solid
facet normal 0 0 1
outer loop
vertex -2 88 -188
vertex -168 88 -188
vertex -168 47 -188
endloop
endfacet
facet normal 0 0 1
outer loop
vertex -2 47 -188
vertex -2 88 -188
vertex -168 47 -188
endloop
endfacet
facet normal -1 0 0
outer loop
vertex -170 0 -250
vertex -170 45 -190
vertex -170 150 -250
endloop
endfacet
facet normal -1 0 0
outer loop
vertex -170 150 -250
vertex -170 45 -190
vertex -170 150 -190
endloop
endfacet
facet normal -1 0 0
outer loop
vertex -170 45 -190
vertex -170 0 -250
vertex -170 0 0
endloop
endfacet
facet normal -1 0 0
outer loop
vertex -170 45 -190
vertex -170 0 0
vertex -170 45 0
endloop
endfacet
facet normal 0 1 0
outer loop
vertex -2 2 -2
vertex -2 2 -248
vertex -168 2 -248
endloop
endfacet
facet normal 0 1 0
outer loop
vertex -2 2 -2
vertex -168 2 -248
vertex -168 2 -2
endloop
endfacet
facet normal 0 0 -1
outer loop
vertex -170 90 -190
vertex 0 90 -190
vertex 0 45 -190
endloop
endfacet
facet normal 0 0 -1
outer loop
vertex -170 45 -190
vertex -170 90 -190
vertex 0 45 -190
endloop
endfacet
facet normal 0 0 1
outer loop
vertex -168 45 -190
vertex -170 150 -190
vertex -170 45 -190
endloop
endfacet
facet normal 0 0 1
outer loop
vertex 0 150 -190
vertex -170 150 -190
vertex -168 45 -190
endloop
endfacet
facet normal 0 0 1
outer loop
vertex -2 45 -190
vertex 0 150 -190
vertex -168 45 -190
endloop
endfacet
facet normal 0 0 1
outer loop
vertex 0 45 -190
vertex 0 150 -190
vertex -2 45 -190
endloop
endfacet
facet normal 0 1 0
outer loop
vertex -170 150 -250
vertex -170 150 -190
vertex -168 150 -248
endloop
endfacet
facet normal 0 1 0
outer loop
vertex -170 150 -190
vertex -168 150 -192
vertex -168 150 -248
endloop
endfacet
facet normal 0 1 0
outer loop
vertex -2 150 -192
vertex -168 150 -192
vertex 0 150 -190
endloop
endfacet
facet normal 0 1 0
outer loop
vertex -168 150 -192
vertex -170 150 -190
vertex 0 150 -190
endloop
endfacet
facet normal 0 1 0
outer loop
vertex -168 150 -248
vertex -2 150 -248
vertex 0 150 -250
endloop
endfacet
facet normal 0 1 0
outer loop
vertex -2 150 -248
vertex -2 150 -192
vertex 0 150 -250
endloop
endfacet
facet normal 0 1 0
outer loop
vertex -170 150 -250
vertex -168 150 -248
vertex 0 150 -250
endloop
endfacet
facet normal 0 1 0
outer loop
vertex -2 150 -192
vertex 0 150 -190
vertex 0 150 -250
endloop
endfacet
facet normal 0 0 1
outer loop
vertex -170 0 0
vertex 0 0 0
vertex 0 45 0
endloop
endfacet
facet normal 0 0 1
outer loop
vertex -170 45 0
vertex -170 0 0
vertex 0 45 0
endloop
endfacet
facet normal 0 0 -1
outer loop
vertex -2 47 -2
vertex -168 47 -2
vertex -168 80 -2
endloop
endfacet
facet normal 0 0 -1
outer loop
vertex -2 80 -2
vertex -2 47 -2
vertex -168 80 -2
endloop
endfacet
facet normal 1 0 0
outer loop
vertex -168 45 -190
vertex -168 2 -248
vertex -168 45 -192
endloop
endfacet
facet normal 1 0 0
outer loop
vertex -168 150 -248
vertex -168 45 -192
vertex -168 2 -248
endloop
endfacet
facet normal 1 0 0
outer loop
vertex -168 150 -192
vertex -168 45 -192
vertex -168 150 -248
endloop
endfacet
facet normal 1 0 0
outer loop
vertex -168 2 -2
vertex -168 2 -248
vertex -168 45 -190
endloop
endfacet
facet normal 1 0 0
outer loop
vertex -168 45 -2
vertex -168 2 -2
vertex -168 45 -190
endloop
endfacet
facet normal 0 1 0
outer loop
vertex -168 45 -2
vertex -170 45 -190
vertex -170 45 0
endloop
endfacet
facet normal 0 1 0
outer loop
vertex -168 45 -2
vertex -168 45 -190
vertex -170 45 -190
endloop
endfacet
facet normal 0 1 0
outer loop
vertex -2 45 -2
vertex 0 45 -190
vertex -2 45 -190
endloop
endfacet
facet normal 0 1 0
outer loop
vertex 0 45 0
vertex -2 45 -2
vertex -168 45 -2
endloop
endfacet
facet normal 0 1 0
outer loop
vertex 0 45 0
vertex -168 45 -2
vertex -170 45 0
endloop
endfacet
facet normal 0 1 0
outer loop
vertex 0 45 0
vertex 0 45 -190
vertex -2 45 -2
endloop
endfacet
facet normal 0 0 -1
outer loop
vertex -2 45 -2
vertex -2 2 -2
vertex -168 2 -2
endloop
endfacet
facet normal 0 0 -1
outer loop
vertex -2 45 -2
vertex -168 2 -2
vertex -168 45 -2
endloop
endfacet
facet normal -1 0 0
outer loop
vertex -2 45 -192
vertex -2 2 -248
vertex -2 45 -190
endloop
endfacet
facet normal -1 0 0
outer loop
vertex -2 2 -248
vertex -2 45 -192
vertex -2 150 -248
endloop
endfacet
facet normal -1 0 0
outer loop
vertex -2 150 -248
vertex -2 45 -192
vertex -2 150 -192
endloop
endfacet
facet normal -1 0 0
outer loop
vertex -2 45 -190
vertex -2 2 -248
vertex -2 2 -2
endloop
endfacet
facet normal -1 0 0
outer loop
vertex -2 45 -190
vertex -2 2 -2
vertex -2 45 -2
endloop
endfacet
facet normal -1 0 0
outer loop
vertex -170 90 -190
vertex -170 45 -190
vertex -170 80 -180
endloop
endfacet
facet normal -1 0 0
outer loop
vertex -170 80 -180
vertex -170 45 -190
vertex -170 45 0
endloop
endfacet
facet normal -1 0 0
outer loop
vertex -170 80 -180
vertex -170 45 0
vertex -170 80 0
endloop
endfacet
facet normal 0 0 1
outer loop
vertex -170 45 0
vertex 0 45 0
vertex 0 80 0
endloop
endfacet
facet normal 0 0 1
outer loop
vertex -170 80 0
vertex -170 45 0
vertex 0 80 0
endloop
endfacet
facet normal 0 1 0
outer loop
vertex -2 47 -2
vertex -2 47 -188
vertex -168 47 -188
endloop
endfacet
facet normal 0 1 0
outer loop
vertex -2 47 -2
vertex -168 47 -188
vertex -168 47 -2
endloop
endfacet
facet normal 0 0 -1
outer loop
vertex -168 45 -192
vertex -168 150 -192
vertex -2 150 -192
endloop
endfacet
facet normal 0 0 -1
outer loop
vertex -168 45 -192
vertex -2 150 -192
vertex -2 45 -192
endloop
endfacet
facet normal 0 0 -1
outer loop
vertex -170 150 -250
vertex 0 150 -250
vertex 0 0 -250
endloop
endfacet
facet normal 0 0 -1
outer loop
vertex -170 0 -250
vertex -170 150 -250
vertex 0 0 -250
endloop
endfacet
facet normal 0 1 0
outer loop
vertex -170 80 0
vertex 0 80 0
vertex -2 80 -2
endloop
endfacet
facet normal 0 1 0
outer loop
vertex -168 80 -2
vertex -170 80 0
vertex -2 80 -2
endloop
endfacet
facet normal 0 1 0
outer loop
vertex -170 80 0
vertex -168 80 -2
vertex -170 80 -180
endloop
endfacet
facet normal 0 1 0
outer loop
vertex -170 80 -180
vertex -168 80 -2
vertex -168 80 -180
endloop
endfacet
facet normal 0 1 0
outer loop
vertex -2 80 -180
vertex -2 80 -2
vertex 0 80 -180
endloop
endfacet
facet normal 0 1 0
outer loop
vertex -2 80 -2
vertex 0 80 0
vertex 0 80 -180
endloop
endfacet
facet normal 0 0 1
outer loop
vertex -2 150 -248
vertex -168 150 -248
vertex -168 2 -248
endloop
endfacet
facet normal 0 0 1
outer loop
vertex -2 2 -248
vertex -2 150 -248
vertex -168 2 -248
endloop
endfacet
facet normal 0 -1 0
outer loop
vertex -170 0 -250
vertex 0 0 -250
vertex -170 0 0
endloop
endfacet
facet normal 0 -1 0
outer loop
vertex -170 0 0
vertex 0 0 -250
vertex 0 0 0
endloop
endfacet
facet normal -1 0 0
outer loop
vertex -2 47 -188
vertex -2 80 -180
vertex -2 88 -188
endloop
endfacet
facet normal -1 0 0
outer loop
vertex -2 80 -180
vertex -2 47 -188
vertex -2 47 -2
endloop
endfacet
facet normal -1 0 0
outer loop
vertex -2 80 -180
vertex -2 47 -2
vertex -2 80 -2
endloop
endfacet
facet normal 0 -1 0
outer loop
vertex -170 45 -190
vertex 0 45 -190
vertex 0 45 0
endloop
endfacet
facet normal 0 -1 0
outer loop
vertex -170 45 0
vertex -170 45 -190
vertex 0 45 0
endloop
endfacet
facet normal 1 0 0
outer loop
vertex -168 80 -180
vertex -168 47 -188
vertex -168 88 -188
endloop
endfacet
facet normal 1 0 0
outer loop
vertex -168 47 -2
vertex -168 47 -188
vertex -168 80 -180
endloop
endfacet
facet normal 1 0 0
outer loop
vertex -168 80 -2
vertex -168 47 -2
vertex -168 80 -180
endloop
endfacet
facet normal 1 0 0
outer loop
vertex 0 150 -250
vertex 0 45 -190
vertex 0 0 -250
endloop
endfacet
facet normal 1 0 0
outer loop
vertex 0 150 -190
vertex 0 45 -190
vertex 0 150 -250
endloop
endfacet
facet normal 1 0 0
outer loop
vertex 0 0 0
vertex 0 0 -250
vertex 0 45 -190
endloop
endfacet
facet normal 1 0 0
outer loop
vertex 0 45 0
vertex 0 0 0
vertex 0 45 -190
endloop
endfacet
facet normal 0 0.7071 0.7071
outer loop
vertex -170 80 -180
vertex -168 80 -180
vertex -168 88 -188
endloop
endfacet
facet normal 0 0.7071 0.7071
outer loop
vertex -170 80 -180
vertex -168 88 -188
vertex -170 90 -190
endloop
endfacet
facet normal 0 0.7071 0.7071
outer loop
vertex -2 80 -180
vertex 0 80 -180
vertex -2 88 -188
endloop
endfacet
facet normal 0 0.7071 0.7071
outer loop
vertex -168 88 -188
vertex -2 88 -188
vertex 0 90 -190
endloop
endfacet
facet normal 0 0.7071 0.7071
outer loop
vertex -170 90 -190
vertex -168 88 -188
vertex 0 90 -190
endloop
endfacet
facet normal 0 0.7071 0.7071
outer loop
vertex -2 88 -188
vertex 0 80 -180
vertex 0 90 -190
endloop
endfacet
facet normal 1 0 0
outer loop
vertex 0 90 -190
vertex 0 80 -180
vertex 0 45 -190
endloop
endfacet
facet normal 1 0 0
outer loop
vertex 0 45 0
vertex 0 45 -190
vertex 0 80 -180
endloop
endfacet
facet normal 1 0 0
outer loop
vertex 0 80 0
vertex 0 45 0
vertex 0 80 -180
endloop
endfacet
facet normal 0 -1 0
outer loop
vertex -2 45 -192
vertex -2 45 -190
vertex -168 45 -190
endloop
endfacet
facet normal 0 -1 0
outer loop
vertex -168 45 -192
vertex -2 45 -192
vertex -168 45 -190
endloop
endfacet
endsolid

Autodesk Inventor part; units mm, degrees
ref_plane "YZ Plane" through (0, 0, 0) normal (1, 0, 0) x (0, 1, 0)
ref_plane "XZ Plane" through (0, 0, 0) normal (0, 1, 0) x (-1, 0, 0)
ref_plane "XY Plane" through (0, 0, 0) normal (0, 0, 1) x (1, 0, 0)
sketch "Sketch1" plane through (0, 0, 0) normal (1, 0, 0) x (0, 1, 0)
  line L0 (0, 0) -> (80, 0)
  line L1 (80, 0) -> (80, -180)
  line L2 (80, -180) -> (90, -190)
  line L3 (90, -190) -> (150, -190)
  line L4 (150, -190) -> (150, -250)
  line L5 (150, -250) -> (0, -250)
  line L6 (0, -250) -> (0, 0)
  line L7 (45, 0) -> (235, 0) construction
  line L8 (45, -190) -> (45, 0)
  line L9 (90, -190) -> (45, -190)
  dimension "d1" = 150
  dimension "d2" = 60
  dimension "d3" = 180
  dimension "d4" = 80
  dimension "d6" = 250
  dimension "d11" = 35
extrude "Extrusion1" add sketch "Sketch1" against normal blind 170 contours L0 L8 L9 L3 L4 L5 L6
extrude "Extrusion2" add sketch "Sketch1" against normal blind 170 separate body contours L0 L1 L2 L9 L8
shell "Shell1" thickness 2 removed faces 2 at (-113.3333, 86.6667, -186.6667) at (-56.6667, 80, -120)
shell "Shell2" thickness 2 removed faces 3 at (-56.6667, 150, -230) at (-56.6667, 45, -126.6667) at (-56.6667, 45, -63.3333)
